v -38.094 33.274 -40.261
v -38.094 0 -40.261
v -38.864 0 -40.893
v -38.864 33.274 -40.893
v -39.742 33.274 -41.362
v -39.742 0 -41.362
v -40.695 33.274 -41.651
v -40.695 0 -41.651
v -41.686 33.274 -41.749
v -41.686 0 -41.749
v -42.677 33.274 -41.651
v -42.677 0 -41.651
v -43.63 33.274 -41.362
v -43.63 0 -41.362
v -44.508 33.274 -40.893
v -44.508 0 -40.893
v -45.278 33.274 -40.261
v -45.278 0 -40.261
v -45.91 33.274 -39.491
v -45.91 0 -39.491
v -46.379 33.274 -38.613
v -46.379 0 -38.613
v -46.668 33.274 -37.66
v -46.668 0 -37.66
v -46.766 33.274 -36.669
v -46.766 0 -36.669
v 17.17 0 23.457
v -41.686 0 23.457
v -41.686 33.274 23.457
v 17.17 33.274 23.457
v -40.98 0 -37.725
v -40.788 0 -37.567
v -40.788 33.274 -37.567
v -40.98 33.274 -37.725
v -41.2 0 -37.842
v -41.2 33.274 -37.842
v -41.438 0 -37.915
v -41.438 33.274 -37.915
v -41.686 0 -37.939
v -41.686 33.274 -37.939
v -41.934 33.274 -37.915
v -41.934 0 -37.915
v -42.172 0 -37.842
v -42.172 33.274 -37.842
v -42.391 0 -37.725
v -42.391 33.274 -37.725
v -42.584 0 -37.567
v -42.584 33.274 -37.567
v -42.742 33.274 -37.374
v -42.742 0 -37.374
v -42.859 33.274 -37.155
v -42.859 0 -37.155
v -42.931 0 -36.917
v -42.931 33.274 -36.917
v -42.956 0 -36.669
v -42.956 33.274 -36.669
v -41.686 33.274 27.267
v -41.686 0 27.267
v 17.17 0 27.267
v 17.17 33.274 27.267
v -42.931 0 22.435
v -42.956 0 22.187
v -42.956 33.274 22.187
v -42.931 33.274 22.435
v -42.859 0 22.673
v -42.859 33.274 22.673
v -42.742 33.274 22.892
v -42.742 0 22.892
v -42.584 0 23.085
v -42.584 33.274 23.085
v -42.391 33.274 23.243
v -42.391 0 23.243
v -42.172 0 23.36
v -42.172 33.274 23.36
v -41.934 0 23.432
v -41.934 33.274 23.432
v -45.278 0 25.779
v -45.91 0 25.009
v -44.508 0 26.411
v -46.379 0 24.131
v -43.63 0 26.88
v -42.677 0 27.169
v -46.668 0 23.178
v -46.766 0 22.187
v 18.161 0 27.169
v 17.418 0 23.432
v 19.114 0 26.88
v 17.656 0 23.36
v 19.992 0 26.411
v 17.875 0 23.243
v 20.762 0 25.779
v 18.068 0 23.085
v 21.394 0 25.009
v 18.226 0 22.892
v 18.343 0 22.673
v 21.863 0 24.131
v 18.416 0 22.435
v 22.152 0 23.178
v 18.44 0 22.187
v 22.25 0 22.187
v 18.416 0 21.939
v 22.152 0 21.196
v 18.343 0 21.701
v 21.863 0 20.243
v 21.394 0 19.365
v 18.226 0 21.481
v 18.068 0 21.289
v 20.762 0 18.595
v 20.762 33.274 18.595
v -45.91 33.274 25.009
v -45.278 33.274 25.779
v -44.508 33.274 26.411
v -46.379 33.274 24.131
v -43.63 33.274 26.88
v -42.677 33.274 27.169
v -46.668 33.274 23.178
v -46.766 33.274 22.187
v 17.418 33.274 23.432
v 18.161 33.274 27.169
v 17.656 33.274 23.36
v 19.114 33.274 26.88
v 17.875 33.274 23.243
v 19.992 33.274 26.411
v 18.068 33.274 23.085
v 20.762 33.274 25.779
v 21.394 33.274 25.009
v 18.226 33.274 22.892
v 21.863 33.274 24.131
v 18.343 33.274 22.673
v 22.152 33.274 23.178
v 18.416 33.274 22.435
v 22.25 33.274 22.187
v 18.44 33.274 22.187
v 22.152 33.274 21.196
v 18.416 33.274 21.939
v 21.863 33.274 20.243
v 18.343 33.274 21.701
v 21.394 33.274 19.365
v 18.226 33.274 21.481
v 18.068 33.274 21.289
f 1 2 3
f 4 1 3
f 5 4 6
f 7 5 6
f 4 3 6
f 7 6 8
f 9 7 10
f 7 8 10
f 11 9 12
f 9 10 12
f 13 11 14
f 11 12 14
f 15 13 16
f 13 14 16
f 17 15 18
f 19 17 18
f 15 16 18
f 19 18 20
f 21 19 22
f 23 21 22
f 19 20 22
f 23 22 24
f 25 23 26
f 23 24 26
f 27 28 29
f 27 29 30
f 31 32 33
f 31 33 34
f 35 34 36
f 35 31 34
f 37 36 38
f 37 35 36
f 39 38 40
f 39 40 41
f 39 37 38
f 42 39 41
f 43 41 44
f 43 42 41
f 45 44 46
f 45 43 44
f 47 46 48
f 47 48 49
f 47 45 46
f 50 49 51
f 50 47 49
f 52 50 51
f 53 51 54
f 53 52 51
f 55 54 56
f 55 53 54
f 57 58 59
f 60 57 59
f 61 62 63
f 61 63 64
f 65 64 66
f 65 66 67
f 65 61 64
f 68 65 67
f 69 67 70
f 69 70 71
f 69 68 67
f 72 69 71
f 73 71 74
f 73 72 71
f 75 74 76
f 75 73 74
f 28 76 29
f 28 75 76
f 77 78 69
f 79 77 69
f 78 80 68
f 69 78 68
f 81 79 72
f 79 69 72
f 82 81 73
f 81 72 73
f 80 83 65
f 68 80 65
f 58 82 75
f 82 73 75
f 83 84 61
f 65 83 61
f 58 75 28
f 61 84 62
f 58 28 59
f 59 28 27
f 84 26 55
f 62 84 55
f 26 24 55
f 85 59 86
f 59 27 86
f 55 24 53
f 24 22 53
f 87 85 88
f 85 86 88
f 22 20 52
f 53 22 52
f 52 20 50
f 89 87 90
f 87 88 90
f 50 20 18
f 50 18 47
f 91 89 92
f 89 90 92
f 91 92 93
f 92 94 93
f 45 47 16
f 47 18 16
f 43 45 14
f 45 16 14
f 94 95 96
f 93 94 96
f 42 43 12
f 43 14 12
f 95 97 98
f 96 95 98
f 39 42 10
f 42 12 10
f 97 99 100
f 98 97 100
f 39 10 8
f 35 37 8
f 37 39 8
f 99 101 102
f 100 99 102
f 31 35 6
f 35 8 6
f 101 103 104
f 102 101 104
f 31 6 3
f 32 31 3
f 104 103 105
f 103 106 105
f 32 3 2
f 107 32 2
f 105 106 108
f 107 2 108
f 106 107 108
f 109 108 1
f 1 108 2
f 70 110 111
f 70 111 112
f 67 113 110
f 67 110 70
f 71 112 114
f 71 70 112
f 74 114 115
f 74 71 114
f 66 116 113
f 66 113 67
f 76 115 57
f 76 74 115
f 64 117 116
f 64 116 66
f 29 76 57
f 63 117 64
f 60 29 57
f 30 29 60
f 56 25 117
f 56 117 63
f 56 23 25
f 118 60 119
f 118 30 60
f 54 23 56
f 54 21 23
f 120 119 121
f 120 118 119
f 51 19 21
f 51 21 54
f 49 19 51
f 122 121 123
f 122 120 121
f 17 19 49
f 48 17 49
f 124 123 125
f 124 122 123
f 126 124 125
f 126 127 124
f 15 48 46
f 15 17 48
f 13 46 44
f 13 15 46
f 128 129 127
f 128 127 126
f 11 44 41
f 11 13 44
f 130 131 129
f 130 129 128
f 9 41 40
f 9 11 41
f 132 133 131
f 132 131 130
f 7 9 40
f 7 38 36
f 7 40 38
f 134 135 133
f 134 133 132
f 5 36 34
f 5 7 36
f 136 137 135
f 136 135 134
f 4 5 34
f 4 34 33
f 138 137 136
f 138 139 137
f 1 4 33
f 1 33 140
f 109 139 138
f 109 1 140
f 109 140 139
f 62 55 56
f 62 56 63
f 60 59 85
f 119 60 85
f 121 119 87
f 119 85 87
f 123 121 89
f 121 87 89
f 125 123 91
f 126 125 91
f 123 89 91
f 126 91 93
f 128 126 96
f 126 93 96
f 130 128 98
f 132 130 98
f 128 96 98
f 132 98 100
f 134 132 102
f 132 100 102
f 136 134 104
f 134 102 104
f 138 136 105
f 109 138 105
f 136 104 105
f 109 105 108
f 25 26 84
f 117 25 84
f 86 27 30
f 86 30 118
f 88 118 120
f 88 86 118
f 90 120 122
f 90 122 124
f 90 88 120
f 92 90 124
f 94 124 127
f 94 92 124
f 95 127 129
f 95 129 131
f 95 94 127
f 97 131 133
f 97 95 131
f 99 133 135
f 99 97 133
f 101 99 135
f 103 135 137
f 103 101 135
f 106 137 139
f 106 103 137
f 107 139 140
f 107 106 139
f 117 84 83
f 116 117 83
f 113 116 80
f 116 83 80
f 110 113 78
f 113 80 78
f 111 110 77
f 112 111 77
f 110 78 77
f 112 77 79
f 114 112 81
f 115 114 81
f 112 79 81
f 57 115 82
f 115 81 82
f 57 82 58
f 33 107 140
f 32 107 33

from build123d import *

# Parameters (mm, degrees)
EXTRUDE1_DEPTH = 33.274


with BuildPart() as part:
    # Sketch1 → Extrude1 (new body)
    with BuildSketch(Plane(origin=(0, 0, 0), x_dir=(1, 0, 0), z_dir=(0, 1, 0))):
        with BuildLine():
            Line((-46.765869926, 36.668915011), (-46.765869926, -22.186880092))
            ThreePointArc((-46.765869926, -22.186880092), (-45.277972374, -25.778982541), (-41.685869926, -27.266880092))
            Line((-41.685869926, -27.266880092), (17.169925177, -27.266880092))
            ThreePointArc((17.169925177, -27.266880092), (21.863233202, -24.130911929), (20.762027626, -18.594777644))
            Line((20.762027626, -18.594777644), (-38.093767478, 40.261017459))
            ThreePointArc((-38.093767478, 40.261017459), (-43.629901762, 41.362223036), (-46.765869926, 36.668915011))
        make_face()
        with BuildLine():
            Line((-42.955869926, 36.668915011), (-42.955869926, -22.186880092))
            ThreePointArc((-42.955869926, -22.186880092), (-42.583895538, -23.084905705), (-41.685869926, -23.456880092))
            Line((-41.685869926, -23.456880092), (17.169925177, -23.456880092))
            ThreePointArc((17.169925177, -23.456880092), (18.343252183, -22.672888052), (18.067950789, -21.28885448))
            Line((18.067950789, -21.28885448), (-40.787844314, 37.566940623))
            ThreePointArc((-40.787844314, 37.566940623), (-42.171877885, 37.842242017), (-42.955869926, 36.668915011))
        make_face(mode=Mode.SUBTRACT)
    extrude(amount=EXTRUDE1_DEPTH)


solid = part.part
